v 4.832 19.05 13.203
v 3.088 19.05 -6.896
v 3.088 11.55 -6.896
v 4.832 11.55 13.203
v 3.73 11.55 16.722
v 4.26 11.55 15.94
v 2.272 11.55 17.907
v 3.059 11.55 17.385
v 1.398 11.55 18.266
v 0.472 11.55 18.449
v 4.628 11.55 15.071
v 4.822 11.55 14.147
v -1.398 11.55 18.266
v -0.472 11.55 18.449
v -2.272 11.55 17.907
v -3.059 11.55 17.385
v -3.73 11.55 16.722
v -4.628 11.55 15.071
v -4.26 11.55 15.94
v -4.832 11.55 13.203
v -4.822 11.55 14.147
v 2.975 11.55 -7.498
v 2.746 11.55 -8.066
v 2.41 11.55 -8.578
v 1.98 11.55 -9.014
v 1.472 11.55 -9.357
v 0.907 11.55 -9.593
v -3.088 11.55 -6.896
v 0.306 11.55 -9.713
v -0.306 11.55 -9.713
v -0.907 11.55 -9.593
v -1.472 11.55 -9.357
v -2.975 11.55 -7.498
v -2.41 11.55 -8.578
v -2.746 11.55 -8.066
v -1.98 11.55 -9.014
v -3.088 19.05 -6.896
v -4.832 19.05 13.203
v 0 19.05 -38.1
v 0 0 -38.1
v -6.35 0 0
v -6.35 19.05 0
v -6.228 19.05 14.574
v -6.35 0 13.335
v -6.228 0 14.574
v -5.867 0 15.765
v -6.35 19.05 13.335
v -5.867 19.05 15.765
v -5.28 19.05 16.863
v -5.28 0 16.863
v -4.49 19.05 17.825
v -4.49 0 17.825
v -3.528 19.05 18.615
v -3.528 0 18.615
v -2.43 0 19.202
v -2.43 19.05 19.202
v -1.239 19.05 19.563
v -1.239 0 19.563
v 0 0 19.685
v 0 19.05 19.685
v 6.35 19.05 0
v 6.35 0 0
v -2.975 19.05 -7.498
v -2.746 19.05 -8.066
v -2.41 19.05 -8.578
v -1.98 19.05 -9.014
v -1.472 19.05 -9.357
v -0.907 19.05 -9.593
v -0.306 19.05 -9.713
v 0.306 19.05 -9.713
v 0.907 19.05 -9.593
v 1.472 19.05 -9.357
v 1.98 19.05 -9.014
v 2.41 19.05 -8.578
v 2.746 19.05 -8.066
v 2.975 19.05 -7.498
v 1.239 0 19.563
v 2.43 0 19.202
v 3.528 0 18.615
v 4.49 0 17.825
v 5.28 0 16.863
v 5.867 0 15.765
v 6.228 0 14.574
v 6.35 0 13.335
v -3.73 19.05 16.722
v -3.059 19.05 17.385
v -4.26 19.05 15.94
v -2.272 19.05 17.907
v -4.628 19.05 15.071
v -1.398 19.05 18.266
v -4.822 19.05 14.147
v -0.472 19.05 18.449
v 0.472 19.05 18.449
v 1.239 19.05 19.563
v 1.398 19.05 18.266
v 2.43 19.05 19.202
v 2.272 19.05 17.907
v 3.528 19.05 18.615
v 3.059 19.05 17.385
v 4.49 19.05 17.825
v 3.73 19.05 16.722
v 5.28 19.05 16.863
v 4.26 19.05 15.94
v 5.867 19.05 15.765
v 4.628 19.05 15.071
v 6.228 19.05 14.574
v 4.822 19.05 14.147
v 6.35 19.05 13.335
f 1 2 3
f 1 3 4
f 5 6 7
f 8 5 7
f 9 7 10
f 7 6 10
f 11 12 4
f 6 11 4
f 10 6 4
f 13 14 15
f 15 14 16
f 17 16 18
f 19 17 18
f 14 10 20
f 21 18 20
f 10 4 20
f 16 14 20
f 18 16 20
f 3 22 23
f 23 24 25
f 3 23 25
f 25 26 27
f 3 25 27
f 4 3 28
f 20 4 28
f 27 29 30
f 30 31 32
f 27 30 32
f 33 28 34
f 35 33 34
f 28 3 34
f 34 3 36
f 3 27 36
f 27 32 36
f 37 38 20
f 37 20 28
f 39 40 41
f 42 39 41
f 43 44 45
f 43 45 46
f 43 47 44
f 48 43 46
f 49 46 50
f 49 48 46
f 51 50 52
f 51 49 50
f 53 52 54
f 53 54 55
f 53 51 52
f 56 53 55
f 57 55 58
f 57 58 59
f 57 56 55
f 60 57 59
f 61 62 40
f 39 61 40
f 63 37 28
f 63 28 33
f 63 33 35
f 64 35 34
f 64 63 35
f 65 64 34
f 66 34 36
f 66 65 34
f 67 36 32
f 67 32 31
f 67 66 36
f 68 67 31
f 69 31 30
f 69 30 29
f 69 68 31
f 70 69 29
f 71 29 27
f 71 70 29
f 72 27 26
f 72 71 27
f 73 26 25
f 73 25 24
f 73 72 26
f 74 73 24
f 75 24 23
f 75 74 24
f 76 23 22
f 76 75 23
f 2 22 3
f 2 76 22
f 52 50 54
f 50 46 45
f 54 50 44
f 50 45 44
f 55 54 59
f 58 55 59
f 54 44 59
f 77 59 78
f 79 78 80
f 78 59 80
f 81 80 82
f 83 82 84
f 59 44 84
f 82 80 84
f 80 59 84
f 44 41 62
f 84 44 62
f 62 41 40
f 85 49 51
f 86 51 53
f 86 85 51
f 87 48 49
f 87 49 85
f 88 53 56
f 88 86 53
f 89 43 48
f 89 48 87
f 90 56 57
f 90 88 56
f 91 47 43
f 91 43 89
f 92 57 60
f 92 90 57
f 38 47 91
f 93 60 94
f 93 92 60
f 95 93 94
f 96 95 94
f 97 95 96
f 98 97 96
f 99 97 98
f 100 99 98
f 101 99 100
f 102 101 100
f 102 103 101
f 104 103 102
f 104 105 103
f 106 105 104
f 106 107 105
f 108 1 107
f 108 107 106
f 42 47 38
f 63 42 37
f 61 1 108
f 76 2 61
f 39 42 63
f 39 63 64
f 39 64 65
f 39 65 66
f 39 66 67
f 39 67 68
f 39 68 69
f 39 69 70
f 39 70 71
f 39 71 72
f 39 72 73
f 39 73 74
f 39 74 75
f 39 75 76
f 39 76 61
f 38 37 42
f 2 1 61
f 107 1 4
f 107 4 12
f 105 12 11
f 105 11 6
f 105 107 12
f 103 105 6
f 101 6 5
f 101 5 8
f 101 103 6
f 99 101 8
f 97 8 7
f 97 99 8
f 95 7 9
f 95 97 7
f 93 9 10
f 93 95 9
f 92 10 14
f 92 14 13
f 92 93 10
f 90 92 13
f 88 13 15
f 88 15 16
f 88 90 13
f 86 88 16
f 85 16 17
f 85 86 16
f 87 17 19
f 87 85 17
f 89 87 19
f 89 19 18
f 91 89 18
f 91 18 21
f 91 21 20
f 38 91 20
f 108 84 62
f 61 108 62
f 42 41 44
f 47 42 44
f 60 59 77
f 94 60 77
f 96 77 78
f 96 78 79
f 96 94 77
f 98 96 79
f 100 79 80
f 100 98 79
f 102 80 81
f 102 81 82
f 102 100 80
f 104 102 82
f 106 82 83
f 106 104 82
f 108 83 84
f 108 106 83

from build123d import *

# Parameters (mm, degrees)
BOSS_EXTRUDE1_DEPTH = 19.05
FILLET1_R           = 6.35
CUT_EXTRUDE1_DEPTH  = 7.5


with BuildPart() as part:
    # Sketch1 → Boss-Extrude1 (new body)
    with BuildSketch(Plane(origin=(0, 0, 0), x_dir=(1, 0, 0), z_dir=(0, 1, 0))):
        Polygon((0, 38.1), (-6.35, 0), (-6.35, -19.685), (6.35, -19.685), (6.35, 0), align=None)
    extrude(amount=BOSS_EXTRUDE1_DEPTH)

    # Fillet1
    fillet1_edges = [part.edges().sort_by_distance(p)[0] for p in [
        (-6.35, 9.525, 19.685),
        (6.35, 9.525, 19.685),
    ]]
    fillet(fillet1_edges, radius=FILLET1_R - 0.0001)  # a hair under: the kernel refuses the full size

    # Sketch4 → Cut-Extrude1 (cut)
    with BuildSketch(Plane(origin=(0, 19.05, 0), x_dir=(1, 0, 0), z_dir=(0, 1, 0))):
        with BuildLine():
            Line((-4.831855252, -13.202514523), (-3.088402326, 6.896250909))
            ThreePointArc((-3.088402326, 6.896250909), (0, 9.728349675), (3.088402326, 6.896250909))
            Line((3.088402326, 6.896250909), (4.831855252, -13.202514523))
            ThreePointArc((4.831855252, -13.202514523), (0, -18.471650325), (-4.831855252, -13.202514523))
        make_face()
    extrude(amount=-CUT_EXTRUDE1_DEPTH, mode=Mode.SUBTRACT)


solid = part.part
